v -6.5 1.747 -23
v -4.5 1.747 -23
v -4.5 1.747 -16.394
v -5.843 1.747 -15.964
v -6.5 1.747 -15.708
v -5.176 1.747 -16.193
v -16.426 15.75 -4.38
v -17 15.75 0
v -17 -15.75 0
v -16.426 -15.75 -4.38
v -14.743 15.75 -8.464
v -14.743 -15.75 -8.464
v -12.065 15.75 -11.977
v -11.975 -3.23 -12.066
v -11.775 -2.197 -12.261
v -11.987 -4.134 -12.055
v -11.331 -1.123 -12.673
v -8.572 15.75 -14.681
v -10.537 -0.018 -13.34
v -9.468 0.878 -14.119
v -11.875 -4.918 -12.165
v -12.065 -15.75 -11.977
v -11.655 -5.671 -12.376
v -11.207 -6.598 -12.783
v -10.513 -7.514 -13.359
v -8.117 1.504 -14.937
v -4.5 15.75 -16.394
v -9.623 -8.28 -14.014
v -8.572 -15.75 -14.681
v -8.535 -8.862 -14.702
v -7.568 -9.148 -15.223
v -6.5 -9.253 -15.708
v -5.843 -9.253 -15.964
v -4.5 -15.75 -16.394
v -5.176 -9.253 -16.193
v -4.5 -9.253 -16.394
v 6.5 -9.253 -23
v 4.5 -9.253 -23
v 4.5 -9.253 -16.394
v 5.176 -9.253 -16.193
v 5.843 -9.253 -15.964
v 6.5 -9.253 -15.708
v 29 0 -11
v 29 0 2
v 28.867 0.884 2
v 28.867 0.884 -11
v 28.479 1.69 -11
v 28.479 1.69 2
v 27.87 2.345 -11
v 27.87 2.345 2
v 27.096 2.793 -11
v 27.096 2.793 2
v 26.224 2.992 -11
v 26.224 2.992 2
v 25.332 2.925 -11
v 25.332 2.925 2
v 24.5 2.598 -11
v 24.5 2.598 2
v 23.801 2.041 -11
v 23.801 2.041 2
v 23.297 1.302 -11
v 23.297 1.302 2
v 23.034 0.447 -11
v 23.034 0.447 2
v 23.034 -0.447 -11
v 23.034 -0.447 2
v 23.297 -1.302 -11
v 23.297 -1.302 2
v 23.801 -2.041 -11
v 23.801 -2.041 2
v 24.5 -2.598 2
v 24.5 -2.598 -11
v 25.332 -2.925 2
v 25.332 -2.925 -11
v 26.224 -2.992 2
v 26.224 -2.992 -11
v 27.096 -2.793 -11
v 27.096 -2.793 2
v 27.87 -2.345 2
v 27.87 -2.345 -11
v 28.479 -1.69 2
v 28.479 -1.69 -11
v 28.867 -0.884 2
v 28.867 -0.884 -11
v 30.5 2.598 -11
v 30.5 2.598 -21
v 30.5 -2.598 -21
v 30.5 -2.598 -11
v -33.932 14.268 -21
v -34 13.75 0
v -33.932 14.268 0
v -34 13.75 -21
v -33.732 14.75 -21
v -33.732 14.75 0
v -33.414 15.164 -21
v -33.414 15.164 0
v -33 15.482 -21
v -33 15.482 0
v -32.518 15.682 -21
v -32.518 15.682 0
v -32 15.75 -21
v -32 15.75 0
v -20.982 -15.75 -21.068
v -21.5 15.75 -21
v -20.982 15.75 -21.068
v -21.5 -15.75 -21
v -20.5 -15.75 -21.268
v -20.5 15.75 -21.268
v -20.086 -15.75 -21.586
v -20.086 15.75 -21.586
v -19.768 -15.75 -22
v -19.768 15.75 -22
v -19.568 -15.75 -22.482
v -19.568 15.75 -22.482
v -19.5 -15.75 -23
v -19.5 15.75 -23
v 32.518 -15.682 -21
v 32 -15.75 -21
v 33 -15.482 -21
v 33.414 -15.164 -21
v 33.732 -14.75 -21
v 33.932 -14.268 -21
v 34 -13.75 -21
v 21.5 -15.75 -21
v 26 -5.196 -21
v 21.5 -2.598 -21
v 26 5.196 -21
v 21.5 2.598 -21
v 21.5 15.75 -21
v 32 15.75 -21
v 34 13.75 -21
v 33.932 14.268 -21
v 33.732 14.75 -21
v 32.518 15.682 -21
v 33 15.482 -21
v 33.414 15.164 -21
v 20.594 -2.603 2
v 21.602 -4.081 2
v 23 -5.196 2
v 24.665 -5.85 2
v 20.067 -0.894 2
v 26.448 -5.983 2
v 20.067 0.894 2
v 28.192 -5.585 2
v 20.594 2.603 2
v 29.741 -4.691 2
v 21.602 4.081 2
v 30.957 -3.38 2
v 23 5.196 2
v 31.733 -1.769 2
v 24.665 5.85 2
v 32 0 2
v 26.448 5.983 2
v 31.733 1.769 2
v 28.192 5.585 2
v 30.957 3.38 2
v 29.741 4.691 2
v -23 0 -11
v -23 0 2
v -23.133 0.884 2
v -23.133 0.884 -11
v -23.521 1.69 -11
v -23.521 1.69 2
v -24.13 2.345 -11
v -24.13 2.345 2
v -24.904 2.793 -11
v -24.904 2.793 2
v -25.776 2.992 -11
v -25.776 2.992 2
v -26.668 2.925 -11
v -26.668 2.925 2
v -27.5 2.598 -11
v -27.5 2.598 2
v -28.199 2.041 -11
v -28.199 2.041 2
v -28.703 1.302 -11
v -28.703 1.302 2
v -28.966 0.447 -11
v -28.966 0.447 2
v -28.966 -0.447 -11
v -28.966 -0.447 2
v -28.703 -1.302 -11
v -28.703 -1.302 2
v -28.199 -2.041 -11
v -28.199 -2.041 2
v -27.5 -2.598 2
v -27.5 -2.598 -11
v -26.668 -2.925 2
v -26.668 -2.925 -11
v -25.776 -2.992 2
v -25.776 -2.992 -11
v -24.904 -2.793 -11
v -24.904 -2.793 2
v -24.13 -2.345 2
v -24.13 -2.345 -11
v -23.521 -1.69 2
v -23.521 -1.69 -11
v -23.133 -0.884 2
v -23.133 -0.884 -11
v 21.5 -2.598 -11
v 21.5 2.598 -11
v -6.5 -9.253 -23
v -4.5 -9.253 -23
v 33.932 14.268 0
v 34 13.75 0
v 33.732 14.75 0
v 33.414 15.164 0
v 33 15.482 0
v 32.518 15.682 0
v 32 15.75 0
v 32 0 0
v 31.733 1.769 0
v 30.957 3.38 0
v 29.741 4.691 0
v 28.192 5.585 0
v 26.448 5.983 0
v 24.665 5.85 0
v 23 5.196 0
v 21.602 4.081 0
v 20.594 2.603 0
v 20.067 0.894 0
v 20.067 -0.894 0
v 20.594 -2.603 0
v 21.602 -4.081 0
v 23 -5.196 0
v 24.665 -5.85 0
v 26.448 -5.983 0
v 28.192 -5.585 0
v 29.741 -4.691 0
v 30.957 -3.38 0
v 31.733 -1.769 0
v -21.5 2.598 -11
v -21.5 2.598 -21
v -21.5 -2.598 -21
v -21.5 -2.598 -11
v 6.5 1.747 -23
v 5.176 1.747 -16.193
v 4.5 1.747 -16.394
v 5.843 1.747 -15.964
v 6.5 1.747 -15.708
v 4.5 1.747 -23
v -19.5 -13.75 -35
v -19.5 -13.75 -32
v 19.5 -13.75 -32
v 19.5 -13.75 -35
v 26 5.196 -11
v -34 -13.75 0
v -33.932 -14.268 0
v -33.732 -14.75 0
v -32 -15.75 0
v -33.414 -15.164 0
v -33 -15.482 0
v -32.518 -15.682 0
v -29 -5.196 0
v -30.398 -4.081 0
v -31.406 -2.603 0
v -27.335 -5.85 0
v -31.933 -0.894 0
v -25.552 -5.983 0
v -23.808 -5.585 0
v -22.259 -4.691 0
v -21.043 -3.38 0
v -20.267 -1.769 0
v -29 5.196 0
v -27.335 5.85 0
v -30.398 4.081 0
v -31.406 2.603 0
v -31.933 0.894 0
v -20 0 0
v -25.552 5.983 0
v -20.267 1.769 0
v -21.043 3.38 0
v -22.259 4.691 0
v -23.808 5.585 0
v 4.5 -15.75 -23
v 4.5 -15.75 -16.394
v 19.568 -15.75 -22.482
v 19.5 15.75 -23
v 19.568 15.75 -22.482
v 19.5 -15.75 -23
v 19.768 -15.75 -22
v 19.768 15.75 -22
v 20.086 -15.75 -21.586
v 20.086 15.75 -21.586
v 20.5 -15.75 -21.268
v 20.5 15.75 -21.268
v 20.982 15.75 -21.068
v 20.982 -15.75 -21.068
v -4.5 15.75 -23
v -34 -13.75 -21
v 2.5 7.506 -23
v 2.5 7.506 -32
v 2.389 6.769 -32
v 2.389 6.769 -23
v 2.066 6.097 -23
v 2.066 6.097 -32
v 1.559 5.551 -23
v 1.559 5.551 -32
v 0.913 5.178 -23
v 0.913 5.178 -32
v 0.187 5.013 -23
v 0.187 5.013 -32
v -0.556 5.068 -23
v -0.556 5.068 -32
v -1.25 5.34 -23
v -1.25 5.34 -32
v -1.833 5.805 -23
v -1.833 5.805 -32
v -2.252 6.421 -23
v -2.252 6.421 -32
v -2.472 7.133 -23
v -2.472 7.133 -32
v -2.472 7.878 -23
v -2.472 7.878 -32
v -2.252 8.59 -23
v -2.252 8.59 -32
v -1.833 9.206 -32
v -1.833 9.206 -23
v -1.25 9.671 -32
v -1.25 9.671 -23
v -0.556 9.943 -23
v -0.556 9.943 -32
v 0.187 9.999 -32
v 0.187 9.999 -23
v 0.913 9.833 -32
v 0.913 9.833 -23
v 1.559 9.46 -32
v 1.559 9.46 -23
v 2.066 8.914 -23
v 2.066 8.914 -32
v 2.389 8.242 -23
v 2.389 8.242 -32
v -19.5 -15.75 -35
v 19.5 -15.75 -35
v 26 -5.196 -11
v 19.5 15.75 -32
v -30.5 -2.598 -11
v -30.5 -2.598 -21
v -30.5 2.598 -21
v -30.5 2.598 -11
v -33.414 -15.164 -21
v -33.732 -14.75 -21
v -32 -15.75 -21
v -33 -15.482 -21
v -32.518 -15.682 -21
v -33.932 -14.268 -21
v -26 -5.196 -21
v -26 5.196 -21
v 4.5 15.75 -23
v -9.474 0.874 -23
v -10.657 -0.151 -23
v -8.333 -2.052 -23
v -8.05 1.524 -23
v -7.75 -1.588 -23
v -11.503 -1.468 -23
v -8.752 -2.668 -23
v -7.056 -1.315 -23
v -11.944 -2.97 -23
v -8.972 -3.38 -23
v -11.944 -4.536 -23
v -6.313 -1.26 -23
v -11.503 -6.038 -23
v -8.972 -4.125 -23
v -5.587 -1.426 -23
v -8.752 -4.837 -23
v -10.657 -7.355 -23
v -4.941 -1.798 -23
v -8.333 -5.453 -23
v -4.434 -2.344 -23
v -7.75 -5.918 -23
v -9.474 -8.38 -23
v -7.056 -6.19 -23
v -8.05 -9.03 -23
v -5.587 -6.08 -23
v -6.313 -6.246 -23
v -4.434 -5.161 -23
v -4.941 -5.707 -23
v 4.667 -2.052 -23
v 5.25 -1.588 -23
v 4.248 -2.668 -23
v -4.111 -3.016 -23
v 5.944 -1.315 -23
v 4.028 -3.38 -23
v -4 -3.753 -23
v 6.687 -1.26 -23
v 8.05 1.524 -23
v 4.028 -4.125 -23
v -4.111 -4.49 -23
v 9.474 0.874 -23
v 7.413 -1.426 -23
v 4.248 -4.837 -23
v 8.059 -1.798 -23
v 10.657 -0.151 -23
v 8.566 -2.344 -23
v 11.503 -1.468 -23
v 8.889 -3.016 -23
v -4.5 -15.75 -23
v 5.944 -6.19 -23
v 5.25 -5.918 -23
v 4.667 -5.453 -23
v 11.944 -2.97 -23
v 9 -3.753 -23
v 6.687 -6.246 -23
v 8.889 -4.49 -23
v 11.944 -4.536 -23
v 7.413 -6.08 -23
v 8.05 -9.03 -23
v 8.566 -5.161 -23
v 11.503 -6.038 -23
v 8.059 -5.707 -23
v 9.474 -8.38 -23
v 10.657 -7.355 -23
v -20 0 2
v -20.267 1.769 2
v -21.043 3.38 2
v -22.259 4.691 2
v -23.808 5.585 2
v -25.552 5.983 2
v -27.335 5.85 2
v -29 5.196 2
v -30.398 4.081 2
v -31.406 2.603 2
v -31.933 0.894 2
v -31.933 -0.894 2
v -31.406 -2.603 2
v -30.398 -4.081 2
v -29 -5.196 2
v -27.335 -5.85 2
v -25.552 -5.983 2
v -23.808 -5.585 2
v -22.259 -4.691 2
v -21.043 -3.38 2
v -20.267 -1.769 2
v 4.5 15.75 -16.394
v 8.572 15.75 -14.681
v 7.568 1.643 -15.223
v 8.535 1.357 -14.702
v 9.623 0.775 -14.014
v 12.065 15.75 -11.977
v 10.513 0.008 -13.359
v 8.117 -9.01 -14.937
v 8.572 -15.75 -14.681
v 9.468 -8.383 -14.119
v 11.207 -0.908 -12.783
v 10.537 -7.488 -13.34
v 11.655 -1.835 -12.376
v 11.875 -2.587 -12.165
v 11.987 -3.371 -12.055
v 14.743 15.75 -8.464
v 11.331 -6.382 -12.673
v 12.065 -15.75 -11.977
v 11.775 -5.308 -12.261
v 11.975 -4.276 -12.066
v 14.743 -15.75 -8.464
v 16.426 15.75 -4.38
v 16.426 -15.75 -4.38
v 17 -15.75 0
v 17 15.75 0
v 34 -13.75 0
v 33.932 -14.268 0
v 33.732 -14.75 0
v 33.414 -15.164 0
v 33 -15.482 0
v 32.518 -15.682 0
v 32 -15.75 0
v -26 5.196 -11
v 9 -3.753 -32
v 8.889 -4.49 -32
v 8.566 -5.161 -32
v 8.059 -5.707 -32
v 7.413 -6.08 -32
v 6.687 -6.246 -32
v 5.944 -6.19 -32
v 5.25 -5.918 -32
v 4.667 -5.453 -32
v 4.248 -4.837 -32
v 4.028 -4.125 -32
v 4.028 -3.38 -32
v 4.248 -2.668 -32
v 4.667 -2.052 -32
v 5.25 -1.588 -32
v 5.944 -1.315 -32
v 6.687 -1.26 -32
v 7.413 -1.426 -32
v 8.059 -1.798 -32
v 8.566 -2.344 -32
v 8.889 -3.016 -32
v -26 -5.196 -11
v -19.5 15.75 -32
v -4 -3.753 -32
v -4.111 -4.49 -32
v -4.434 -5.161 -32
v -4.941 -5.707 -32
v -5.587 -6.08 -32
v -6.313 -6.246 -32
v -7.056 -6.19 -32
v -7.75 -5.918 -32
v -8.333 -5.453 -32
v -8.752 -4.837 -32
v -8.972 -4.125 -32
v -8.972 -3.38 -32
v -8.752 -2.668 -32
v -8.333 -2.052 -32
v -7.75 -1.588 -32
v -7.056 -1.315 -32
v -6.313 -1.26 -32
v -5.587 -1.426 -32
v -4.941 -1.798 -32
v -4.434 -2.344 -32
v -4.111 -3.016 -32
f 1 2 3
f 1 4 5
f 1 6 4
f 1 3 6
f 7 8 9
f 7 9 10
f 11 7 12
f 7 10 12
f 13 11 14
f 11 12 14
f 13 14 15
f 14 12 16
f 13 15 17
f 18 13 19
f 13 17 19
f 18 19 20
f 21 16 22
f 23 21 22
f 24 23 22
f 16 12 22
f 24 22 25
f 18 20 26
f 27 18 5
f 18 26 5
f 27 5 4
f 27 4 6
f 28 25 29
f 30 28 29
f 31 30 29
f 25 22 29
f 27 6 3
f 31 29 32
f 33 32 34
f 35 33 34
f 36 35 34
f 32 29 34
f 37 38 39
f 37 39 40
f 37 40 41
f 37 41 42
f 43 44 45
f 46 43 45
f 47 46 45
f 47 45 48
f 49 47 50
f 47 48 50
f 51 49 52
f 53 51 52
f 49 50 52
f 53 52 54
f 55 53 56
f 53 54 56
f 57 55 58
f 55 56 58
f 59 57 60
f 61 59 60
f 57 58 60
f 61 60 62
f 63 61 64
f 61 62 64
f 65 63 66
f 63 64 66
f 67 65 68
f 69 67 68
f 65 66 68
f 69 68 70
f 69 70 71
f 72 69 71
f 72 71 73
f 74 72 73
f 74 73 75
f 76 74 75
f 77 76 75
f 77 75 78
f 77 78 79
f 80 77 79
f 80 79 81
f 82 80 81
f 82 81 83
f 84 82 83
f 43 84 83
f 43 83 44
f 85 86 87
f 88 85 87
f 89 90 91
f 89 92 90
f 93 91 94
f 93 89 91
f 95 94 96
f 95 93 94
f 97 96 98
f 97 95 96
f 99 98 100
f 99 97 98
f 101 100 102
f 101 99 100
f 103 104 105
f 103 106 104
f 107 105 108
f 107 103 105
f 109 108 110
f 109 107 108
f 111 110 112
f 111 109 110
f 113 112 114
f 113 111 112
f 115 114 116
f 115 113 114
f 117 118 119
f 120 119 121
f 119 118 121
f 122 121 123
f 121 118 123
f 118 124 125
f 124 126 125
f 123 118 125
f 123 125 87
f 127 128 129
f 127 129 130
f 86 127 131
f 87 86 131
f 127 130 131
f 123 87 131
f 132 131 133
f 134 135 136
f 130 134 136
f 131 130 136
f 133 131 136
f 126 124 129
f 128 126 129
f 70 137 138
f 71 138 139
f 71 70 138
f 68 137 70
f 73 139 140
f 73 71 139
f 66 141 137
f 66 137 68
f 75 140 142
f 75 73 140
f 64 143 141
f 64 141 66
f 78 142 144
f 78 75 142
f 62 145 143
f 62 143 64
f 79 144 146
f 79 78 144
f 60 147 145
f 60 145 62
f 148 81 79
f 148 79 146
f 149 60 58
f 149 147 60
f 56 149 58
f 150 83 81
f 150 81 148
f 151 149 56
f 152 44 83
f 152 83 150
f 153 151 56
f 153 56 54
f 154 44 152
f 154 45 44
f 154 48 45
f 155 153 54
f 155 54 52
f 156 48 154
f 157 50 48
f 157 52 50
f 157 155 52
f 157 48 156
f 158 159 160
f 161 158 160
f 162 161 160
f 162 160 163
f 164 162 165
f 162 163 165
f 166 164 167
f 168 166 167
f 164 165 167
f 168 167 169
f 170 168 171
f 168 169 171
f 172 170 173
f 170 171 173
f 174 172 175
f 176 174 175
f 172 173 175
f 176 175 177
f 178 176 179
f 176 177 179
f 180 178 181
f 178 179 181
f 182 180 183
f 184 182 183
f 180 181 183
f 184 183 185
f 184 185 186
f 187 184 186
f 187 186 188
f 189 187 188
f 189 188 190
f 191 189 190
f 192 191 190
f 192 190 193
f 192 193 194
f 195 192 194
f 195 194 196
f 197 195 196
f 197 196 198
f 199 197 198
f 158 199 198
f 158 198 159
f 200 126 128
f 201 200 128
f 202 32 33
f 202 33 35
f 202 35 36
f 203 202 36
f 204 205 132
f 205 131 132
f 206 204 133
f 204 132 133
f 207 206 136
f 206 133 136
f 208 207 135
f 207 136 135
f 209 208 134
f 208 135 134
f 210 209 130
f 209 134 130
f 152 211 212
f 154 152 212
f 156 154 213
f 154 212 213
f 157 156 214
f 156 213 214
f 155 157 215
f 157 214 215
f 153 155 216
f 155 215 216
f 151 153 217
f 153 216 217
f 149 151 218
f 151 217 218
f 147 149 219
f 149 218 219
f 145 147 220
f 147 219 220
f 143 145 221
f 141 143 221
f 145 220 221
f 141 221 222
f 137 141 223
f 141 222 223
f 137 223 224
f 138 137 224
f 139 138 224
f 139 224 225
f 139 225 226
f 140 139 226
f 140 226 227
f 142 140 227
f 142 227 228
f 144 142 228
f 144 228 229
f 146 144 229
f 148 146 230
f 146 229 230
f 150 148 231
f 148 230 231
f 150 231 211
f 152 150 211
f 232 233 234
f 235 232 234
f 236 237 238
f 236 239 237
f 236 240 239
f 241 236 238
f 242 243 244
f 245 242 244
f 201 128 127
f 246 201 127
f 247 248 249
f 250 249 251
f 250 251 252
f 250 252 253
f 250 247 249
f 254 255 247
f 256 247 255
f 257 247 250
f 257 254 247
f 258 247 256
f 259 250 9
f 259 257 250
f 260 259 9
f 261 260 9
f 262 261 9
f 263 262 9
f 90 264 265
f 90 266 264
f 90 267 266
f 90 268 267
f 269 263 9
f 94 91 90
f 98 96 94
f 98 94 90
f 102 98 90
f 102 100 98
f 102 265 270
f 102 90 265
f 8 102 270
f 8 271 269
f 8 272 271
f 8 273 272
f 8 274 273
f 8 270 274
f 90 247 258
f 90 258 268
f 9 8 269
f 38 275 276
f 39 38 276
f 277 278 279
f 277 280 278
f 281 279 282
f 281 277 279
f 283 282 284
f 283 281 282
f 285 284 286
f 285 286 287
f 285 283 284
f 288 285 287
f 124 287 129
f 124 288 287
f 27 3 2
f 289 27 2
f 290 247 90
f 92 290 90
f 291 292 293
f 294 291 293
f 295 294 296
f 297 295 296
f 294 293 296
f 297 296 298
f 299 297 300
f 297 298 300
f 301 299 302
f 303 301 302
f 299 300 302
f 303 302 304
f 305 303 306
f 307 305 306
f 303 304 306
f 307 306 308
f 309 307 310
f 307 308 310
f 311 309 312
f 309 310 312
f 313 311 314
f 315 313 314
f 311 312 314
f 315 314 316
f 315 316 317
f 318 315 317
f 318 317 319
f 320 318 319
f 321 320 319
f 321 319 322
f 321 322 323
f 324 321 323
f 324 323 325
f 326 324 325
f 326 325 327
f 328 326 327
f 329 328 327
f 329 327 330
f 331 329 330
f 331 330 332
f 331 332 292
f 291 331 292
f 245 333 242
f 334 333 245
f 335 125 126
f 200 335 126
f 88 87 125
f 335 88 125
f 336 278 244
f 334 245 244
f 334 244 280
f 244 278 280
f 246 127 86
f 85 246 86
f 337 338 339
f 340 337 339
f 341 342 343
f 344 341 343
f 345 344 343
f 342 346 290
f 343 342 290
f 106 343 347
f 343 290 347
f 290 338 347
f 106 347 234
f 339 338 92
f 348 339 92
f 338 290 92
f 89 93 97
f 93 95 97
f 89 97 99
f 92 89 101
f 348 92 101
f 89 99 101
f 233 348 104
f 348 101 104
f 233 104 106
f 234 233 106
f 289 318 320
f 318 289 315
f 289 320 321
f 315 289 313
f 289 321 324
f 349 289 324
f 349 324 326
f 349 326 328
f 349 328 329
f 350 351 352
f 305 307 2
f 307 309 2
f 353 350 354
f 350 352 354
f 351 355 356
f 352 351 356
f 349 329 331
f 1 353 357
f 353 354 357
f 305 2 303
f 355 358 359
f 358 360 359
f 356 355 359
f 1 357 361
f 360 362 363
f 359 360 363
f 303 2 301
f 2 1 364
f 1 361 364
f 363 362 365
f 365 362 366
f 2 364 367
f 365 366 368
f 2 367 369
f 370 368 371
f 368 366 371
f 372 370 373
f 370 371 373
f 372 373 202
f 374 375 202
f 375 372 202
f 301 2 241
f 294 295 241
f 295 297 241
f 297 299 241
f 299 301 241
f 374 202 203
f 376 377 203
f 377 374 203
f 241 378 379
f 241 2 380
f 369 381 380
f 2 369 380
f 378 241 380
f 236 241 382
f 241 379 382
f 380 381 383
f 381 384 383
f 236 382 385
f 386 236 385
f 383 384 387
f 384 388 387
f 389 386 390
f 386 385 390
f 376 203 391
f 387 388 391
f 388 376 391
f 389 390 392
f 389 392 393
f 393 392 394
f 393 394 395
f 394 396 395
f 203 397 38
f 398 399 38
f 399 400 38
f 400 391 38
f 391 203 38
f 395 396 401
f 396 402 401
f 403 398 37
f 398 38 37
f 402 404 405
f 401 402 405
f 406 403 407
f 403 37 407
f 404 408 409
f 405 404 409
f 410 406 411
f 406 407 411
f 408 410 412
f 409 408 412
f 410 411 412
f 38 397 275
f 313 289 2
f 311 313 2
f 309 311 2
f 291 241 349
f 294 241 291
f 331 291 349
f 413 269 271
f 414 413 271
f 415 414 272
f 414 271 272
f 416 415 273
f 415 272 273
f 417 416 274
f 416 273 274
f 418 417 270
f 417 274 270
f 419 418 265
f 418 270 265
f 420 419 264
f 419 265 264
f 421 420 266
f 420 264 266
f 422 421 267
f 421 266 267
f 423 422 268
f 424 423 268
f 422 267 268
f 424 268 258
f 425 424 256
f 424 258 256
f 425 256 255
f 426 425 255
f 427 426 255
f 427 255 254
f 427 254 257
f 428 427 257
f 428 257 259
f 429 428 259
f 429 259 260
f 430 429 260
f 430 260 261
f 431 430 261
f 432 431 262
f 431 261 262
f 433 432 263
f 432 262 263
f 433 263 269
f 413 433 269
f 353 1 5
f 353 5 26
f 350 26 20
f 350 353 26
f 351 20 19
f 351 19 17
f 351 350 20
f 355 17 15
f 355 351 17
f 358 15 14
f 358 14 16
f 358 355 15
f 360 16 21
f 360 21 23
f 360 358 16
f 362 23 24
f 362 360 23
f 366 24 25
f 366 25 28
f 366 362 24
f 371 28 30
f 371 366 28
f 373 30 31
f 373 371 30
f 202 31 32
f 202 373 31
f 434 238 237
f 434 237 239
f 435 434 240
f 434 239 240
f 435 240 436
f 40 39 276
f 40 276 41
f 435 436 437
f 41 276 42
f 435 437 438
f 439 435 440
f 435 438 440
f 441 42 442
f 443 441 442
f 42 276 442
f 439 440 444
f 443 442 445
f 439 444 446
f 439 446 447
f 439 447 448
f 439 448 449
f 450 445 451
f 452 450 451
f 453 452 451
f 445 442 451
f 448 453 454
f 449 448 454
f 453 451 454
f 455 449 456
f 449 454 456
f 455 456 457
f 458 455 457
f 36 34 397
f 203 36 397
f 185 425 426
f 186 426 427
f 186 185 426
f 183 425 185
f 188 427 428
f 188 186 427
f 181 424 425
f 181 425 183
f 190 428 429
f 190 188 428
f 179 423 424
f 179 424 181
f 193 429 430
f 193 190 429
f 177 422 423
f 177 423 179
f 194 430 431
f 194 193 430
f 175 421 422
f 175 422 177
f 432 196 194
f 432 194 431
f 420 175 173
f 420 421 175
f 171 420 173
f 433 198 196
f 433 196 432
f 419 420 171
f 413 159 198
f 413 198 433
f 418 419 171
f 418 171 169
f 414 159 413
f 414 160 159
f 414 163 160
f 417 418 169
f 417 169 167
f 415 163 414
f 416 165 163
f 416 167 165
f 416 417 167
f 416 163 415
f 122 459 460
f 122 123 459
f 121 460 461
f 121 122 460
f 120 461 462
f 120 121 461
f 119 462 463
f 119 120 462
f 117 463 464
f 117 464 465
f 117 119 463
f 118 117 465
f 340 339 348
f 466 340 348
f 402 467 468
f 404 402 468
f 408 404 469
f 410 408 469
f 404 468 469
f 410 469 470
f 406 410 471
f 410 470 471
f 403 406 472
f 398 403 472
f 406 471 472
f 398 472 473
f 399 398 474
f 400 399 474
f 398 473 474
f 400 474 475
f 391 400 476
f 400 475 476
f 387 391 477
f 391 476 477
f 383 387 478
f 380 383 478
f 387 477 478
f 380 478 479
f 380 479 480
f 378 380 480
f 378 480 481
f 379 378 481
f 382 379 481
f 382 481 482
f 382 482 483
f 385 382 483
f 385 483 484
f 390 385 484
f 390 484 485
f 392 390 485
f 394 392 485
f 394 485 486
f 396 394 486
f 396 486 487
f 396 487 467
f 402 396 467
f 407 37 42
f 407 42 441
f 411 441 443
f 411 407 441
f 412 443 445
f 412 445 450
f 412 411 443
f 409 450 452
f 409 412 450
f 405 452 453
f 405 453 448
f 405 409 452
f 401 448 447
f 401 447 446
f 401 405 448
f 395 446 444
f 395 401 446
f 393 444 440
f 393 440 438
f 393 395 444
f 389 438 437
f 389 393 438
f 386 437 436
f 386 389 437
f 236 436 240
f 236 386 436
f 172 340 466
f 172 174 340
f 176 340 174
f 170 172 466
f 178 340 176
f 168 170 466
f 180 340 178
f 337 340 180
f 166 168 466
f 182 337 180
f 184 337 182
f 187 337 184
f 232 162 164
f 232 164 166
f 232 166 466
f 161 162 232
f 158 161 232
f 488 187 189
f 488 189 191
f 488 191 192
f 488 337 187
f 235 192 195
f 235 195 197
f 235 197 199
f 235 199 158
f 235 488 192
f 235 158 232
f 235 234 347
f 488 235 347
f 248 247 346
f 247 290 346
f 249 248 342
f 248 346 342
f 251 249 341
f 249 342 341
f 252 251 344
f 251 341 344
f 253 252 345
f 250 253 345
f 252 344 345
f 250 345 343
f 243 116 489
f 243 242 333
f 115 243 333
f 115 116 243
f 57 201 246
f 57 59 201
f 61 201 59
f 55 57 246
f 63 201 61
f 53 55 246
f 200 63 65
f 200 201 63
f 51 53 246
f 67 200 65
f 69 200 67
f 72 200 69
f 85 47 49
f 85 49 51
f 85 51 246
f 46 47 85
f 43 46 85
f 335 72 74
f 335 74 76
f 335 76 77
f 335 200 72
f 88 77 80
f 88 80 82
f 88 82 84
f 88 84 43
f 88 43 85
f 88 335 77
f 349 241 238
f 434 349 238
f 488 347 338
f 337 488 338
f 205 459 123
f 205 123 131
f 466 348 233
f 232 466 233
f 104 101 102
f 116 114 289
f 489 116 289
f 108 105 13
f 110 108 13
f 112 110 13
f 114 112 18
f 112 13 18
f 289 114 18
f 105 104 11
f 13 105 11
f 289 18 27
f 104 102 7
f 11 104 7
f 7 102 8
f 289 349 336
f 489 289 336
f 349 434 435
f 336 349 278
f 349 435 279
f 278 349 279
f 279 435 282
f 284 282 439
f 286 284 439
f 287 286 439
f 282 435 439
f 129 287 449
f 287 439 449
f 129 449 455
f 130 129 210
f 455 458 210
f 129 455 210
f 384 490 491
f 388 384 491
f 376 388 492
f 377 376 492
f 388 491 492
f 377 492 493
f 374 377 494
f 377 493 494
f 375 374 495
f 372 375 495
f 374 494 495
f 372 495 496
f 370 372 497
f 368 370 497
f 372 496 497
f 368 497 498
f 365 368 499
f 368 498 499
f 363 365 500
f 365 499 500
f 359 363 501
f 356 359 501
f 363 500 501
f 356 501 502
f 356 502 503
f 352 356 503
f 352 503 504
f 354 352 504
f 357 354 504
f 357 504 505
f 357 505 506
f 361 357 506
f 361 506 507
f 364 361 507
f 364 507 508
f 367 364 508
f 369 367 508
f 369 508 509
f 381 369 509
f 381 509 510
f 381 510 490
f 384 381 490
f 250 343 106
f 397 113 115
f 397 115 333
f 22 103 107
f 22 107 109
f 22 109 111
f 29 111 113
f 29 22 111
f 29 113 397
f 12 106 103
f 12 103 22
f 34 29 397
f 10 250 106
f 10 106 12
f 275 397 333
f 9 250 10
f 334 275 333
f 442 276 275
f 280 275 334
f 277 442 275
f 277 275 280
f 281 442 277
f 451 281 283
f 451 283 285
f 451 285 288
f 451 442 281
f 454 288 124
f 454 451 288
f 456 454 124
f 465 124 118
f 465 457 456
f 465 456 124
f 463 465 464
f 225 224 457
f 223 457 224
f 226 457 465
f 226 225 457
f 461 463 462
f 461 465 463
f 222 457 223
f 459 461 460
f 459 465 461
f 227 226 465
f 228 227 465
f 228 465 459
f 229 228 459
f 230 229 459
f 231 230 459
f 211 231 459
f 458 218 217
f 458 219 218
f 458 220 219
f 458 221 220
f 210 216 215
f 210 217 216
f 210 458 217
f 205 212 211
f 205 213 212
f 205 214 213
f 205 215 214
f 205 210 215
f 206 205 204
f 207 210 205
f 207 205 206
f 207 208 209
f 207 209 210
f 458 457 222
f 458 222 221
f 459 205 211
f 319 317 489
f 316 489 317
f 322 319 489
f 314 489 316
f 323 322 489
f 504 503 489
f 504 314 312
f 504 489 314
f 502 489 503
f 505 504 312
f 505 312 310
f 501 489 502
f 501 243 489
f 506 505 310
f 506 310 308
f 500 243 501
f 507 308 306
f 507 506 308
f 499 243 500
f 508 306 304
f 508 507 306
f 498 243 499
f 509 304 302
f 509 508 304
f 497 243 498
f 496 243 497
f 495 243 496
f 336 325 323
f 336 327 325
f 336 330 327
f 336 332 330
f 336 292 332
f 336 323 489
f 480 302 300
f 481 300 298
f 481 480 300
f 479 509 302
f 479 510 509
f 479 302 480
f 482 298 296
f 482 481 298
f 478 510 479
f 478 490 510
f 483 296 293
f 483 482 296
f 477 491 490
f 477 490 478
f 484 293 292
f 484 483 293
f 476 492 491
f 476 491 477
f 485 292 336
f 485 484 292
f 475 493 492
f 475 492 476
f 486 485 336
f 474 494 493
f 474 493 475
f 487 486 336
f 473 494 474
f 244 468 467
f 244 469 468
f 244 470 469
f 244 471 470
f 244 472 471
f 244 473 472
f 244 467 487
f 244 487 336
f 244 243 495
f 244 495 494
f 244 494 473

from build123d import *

# Parameters (mm, degrees)
F0_W      = 68
F0_H      = 31.5
F1_DEPTH  = 21
F2_W      = 39
F2_H      = 31.5
F3_DEPTH  = 11
F4_R      = 6
F5_DEPTH  = 2
F6_R      = 3
F7_DEPTH  = 34.001
F9_DEPTH  = 10
F11_DEPTH = 31.501
F12_W     = 39
F12_H     = 2
F13_DEPTH = 3
F14_R     = 2.5
F15_DEPTH = 34.001
F17_DEPTH = 25.001
F18_R     = 2
F19_R     = 1.99999


# Not quite as in the source:
# - a fillet or chamfer is up to 0.001 mm smaller than in the source, because OpenCascade refuses the exact size


with BuildPart() as f1:
    # F0 (on Top) → F1 (new body)
    with BuildSketch(Plane.XY):
        Rectangle(F0_W, F0_H)
    extrude(amount=-F1_DEPTH)

    # F2 (on face) → F3 (join)
    with BuildSketch(Plane(origin=(0, 0, -21), x_dir=(1, 0, 0), z_dir=(0, 0, -1))):
        Rectangle(F2_W, F2_H)
    extrude(amount=F3_DEPTH)

    # F4 (on face) → F5 (join)
    with BuildSketch(Plane.XY):
        with Locations((-26, 0)):
            Circle(F4_R)
        with Locations((26, 0)):
            Circle(F4_R)
    extrude(amount=F5_DEPTH)

    # F6 (on face) → F7 (cut, through all)
    with BuildSketch(Plane.XY.offset(2)):
        with Locations((-26, 0)):
            Circle(F6_R)
        with Locations((26, 0)):
            Circle(F6_R)
    extrude(amount=-F7_DEPTH, mode=Mode.SUBTRACT)

    # F8 (on face) → F9 (cut)
    with BuildSketch(Plane(origin=(0, 0, -21), x_dir=(1, 0, 0), z_dir=(0, 0, -1))):
        Polygon((-26, 5.1961524227), (-30.5, 2.5980762114), (-30.5, -2.5980762114), (-26, -5.1961524227), (-21.5, -2.5980762114), (-21.5, 2.5980762114), align=None)
        Polygon((26, -5.1961524227), (30.5, -2.5980762114), (30.5, 2.5980762114), (26, 5.1961524227), (21.5, 2.5980762114), (21.5, -2.5980762114), align=None)
    extrude(amount=-F9_DEPTH, mode=Mode.SUBTRACT)

    # F10 (on face) → F11 (cut, through all)
    with BuildSketch(Plane.XZ.offset(15.75)):
        with BuildLine():
            Line((4.5, -23), (4.5, -16.3935963108))
            ThreePointArc((4.5, -16.3935963108), (13.5185058346, -10.307764064), (17, 0))
            Line((17, 0), (-17, 0))
            ThreePointArc((-17, 0), (-13.5185058346, -10.307764064), (-4.5, -16.3935963108))
            Line((-4.5, -16.3935963108), (-4.5, -23))
            Line((-4.5, -23), (4.5, -23))
        make_face()
    extrude(amount=-F11_DEPTH, mode=Mode.SUBTRACT)

    # F12 (on face) → F13 (join)
    with BuildSketch(Plane(origin=(0, 0, -32), x_dir=(1, 0, 0), z_dir=(0, 0, -1))):
        with Locations((0, 14.75)):
            Rectangle(F12_W, F12_H)
    extrude(amount=F13_DEPTH)

    # F14 (on face) → F15 (cut, through all)
    with BuildSketch(Plane(origin=(0, 0, -32), x_dir=(1, 0, 0), z_dir=(0, 0, -1))):
        with Locations((-6.5, 3.7527767497)):
            Circle(F14_R)
        with Locations((6.5, 3.7527767497)):
            Circle(F14_R)
        with Locations((0, -7.5055534995)):
            Circle(F14_R)
    extrude(amount=-F15_DEPTH, mode=Mode.SUBTRACT)

    # F16 (on face) → F17 (cut, through all)
    with BuildSketch(Plane.XY.offset(-23)):
        with BuildLine():
            ThreePointArc((-6.5, 1.7472232503), (-12, -3.7527767497), (-6.5, -9.2527767497))
            Line((-6.5, -9.2527767497), (6.5, -9.2527767497))
            ThreePointArc((6.5, -9.2527767497), (12, -3.7527767497), (6.5, 1.7472232503))
            Line((6.5, 1.7472232503), (-6.5, 1.7472232503))
        make_face()
    extrude(amount=F17_DEPTH, mode=Mode.SUBTRACT)

    # F18
    f18_edges = [f1.edges().sort_by_distance(p)[0] for p in [
        (-34, -15.75, -10.5),
        (34, -15.75, -10.5),
        (34, 15.75, -10.5),
        (-34, 15.75, -10.5),
    ]]
    fillet(f18_edges, radius=F18_R)

    # F19 (radius 2 in the source; OpenCascade refuses exactly that, so slightly less here)
    f19_edges = [f1.edges().sort_by_distance(p)[0] for p in [
        (-19.5, 0, -21),
        (19.5, 0, -21),
    ]]
    fillet(f19_edges, radius=F19_R)


solid = f1.part
